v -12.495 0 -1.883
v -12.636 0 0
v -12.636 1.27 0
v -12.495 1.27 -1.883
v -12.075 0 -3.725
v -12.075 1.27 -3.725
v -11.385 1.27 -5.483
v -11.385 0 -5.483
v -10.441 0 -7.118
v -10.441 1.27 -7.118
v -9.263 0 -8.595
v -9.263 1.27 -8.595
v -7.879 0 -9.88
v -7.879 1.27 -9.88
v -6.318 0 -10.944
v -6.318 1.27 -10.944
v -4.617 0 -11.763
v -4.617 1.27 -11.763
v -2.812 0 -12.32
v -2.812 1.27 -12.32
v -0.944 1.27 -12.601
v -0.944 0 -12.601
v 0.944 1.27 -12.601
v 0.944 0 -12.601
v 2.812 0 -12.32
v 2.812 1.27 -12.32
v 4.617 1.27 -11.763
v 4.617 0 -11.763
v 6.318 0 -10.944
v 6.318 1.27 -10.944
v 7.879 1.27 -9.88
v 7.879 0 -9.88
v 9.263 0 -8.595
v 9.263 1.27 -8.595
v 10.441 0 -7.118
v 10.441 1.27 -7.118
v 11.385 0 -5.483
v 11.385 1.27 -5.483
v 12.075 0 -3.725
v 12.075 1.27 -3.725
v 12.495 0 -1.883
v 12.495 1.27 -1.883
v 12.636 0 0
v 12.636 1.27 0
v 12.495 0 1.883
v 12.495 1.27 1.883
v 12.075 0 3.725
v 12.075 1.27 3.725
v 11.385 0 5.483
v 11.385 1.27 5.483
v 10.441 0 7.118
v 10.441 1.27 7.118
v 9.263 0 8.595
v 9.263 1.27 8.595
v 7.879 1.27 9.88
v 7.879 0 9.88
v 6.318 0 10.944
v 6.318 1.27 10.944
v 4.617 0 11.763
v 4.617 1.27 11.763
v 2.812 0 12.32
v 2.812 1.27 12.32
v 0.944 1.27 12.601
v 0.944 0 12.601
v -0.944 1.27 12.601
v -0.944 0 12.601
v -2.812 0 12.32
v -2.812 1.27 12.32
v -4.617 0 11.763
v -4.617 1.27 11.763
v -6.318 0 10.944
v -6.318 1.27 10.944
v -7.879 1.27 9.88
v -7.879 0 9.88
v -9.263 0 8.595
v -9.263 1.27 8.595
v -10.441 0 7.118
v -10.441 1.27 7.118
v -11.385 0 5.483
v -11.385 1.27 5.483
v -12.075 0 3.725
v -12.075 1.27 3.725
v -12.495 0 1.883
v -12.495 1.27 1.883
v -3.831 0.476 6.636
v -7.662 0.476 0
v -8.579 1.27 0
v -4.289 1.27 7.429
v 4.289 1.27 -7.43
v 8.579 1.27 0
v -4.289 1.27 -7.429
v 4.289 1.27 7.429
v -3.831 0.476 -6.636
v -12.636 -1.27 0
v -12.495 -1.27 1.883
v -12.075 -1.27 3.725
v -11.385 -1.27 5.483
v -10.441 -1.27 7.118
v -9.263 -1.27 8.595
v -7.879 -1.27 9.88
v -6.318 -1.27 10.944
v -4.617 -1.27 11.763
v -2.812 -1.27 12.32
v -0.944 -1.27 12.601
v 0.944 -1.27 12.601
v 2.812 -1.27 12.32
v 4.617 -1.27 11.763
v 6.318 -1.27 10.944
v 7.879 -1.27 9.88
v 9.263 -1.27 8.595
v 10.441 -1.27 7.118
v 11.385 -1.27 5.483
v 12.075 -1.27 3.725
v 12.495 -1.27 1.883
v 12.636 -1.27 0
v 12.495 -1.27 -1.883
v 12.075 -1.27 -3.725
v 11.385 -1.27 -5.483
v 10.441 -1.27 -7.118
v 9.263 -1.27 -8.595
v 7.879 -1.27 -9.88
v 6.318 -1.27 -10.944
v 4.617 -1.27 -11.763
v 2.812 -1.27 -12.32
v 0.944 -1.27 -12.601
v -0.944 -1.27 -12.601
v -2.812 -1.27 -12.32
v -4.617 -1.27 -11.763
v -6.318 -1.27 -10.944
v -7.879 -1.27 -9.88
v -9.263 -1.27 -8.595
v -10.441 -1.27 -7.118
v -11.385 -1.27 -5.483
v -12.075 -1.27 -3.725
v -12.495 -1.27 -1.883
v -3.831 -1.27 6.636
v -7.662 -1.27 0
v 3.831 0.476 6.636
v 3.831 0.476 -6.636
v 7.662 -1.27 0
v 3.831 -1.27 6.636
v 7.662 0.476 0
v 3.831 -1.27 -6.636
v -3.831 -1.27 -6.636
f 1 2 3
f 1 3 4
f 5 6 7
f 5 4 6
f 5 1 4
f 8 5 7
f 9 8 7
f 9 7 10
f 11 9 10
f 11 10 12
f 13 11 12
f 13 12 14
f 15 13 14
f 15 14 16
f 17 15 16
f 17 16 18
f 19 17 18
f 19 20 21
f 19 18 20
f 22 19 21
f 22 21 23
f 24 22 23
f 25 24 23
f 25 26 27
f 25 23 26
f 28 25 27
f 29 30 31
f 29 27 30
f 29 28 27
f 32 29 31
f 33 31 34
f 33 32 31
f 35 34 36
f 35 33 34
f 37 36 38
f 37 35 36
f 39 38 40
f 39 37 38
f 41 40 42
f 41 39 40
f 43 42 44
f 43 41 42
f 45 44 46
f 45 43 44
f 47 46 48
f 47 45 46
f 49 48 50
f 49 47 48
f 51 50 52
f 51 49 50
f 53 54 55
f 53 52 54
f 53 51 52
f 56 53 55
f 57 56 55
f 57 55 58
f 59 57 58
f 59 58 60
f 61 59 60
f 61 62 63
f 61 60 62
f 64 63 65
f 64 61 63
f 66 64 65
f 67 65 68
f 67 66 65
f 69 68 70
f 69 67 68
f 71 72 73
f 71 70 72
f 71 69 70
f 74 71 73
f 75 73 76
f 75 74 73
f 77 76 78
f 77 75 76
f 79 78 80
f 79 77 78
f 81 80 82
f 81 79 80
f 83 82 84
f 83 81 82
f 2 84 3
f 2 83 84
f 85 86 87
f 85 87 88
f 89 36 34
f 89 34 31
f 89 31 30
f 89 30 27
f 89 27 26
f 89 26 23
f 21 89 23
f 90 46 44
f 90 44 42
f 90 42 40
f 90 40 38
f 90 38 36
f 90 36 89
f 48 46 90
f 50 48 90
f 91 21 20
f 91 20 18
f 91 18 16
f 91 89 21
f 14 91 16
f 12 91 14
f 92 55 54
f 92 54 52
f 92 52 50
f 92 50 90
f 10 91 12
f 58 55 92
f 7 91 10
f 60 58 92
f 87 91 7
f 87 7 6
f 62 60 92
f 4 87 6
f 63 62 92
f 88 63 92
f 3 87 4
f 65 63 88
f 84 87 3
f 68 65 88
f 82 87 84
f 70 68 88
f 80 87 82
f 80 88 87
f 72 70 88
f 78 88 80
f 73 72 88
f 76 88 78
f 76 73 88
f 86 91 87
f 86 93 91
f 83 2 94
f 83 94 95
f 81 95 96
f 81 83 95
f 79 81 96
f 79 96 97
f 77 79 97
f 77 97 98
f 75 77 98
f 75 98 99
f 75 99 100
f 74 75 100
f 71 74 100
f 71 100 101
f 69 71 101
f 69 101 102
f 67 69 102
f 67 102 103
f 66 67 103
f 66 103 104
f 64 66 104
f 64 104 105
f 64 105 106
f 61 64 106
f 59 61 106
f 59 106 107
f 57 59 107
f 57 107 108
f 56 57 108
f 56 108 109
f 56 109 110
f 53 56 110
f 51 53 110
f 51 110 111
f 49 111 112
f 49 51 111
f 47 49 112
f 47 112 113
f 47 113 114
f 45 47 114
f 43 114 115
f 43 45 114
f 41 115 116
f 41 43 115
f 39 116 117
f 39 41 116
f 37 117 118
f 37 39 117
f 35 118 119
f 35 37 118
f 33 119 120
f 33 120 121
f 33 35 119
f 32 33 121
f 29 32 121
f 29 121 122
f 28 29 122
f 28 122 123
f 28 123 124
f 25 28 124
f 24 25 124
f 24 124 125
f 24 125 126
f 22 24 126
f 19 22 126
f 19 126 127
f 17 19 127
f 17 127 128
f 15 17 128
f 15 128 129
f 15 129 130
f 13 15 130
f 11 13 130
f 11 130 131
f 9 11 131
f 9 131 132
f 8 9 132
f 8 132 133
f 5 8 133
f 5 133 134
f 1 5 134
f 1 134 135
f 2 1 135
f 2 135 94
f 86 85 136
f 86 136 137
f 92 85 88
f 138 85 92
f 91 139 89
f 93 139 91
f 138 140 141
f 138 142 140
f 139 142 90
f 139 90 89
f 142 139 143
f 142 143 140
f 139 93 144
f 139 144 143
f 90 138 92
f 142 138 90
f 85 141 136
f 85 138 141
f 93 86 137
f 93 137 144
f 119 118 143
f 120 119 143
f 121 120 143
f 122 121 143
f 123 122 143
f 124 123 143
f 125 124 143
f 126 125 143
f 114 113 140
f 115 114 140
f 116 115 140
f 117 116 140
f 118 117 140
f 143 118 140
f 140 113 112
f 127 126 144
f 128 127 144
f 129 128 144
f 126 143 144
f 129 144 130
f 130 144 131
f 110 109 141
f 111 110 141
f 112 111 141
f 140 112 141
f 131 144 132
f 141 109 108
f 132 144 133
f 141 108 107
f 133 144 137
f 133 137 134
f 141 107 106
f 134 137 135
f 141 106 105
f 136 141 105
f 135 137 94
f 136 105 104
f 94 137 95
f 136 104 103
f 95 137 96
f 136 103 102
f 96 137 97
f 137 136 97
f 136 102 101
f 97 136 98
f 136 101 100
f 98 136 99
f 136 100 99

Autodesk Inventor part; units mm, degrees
ref_plane "YZ Plane" through (0, 0, 0) normal (1, 0, 0) x (0, 1, 0)
ref_plane "XZ Plane" through (0, 0, 0) normal (0, 1, 0) x (-1, 0, 0)
ref_plane "XY Plane" through (0, 0, 0) normal (0, 0, 1) x (1, 0, 0)
sketch "Sketch9" plane through (0, 0, 0) normal (0, 1, 0) x (-1, 0, 0)
  circle A0 centre (0, 0) radius 12.6365
  dimension "d53" = 25.273
extrude "Extrusion6" add sketch "Sketch9" along normal mid plane 2.54
sketch "Sketch15" plane through (0, 1.27, 0) normal (0, 1, 0) x (1, 0, 0)
  line L0 (7.6623, 0) -> (3.8312, -6.6357)
  line L1 (3.8312, -6.6357) -> (-3.8312, -6.6357)
  line L2 (-3.8312, -6.6357) -> (-7.6623, 0)
  line L3 (-7.6623, 0) -> (-3.8312, 6.6357)
  line L4 (-3.8312, 6.6357) -> (3.8312, 6.6358)
  line L5 (3.8312, 6.6358) -> (7.6623, 0)
  point P0 (0, 0)
  point P1 (0, 0)
  dimension "d82" = 13.2715
extrude "Extrusion11" cut sketch "Sketch15" against normal through all
chamfer "Chamfer7" distance 0.7937 angle 45 6 edges at (-5.7467, 1.27, -3.3179) (-5.7467, 1.27, 3.3179) (0, 1.27, 6.6357) (5.7467, 1.27, 3.3179) (5.7467, 1.27, -3.3179) (0, 1.27, -6.6358)
equation "\"d82\" = hexDiameter"
equation "\"holeForString\" = stringDiameter + clearanceForString"
equation "\"stringDiameter\" = 3.048"
equation "\"clearanceForString\" = 2.032"
equation "\"spoolHeightWithoutSpacer\" = 69.85"
equation "\"hexShaftDiameter\" = 12.7"
equation "\"clearanceForHexShaft\" = 0.5715"
equation "\"hexDiameter\" = hexShaftDiameter + clearanceForHexShaft"
equation "\"supportChannels\" = 3.81"
equation "\"spoolInteriorDiameter\" = 38.1"
equation "\"spoolInteriroRadius\" = 0.5 * spoolInteriorDiameter"
equation "\"spoolExteriorDiameter\" = 88.9"
equation "\"spoolExteriorRadius\" = 0.5 * spoolExteriorDiameter"
equation "\"spoolFiletRadius\" = 0.5 * supportChannels"
equation "\"holeCenter\" = 0.25 * spoolHeightWithoutSpacer - 0.75 * supportChannels"
equation "\"hexHoleChamfer\" = 1.5875"
equation "\"stringHoleCenterFromHexShaft\" = 0.5 * hexDiameter + 0.5 * holeForString"
equation "\"textCircleDiameter\" = 0.75 * spoolExteriorDiameter"
equation "\"textHeight\" = 6.096"
equation "\"textDepth\" = 1.27"
equation "\"stringHoleChamfer\" = 4.7625"
equation "\"spoolTotalHeight\" = 76.2"
equation "\"spaceHeight\" = spoolTotalHeight - spoolHeightWithoutSpacer"
equation "\"spacerDiameter\" = 24.13"
properties part number "spacerForEndV05" material "PC/ABS Plastic"
